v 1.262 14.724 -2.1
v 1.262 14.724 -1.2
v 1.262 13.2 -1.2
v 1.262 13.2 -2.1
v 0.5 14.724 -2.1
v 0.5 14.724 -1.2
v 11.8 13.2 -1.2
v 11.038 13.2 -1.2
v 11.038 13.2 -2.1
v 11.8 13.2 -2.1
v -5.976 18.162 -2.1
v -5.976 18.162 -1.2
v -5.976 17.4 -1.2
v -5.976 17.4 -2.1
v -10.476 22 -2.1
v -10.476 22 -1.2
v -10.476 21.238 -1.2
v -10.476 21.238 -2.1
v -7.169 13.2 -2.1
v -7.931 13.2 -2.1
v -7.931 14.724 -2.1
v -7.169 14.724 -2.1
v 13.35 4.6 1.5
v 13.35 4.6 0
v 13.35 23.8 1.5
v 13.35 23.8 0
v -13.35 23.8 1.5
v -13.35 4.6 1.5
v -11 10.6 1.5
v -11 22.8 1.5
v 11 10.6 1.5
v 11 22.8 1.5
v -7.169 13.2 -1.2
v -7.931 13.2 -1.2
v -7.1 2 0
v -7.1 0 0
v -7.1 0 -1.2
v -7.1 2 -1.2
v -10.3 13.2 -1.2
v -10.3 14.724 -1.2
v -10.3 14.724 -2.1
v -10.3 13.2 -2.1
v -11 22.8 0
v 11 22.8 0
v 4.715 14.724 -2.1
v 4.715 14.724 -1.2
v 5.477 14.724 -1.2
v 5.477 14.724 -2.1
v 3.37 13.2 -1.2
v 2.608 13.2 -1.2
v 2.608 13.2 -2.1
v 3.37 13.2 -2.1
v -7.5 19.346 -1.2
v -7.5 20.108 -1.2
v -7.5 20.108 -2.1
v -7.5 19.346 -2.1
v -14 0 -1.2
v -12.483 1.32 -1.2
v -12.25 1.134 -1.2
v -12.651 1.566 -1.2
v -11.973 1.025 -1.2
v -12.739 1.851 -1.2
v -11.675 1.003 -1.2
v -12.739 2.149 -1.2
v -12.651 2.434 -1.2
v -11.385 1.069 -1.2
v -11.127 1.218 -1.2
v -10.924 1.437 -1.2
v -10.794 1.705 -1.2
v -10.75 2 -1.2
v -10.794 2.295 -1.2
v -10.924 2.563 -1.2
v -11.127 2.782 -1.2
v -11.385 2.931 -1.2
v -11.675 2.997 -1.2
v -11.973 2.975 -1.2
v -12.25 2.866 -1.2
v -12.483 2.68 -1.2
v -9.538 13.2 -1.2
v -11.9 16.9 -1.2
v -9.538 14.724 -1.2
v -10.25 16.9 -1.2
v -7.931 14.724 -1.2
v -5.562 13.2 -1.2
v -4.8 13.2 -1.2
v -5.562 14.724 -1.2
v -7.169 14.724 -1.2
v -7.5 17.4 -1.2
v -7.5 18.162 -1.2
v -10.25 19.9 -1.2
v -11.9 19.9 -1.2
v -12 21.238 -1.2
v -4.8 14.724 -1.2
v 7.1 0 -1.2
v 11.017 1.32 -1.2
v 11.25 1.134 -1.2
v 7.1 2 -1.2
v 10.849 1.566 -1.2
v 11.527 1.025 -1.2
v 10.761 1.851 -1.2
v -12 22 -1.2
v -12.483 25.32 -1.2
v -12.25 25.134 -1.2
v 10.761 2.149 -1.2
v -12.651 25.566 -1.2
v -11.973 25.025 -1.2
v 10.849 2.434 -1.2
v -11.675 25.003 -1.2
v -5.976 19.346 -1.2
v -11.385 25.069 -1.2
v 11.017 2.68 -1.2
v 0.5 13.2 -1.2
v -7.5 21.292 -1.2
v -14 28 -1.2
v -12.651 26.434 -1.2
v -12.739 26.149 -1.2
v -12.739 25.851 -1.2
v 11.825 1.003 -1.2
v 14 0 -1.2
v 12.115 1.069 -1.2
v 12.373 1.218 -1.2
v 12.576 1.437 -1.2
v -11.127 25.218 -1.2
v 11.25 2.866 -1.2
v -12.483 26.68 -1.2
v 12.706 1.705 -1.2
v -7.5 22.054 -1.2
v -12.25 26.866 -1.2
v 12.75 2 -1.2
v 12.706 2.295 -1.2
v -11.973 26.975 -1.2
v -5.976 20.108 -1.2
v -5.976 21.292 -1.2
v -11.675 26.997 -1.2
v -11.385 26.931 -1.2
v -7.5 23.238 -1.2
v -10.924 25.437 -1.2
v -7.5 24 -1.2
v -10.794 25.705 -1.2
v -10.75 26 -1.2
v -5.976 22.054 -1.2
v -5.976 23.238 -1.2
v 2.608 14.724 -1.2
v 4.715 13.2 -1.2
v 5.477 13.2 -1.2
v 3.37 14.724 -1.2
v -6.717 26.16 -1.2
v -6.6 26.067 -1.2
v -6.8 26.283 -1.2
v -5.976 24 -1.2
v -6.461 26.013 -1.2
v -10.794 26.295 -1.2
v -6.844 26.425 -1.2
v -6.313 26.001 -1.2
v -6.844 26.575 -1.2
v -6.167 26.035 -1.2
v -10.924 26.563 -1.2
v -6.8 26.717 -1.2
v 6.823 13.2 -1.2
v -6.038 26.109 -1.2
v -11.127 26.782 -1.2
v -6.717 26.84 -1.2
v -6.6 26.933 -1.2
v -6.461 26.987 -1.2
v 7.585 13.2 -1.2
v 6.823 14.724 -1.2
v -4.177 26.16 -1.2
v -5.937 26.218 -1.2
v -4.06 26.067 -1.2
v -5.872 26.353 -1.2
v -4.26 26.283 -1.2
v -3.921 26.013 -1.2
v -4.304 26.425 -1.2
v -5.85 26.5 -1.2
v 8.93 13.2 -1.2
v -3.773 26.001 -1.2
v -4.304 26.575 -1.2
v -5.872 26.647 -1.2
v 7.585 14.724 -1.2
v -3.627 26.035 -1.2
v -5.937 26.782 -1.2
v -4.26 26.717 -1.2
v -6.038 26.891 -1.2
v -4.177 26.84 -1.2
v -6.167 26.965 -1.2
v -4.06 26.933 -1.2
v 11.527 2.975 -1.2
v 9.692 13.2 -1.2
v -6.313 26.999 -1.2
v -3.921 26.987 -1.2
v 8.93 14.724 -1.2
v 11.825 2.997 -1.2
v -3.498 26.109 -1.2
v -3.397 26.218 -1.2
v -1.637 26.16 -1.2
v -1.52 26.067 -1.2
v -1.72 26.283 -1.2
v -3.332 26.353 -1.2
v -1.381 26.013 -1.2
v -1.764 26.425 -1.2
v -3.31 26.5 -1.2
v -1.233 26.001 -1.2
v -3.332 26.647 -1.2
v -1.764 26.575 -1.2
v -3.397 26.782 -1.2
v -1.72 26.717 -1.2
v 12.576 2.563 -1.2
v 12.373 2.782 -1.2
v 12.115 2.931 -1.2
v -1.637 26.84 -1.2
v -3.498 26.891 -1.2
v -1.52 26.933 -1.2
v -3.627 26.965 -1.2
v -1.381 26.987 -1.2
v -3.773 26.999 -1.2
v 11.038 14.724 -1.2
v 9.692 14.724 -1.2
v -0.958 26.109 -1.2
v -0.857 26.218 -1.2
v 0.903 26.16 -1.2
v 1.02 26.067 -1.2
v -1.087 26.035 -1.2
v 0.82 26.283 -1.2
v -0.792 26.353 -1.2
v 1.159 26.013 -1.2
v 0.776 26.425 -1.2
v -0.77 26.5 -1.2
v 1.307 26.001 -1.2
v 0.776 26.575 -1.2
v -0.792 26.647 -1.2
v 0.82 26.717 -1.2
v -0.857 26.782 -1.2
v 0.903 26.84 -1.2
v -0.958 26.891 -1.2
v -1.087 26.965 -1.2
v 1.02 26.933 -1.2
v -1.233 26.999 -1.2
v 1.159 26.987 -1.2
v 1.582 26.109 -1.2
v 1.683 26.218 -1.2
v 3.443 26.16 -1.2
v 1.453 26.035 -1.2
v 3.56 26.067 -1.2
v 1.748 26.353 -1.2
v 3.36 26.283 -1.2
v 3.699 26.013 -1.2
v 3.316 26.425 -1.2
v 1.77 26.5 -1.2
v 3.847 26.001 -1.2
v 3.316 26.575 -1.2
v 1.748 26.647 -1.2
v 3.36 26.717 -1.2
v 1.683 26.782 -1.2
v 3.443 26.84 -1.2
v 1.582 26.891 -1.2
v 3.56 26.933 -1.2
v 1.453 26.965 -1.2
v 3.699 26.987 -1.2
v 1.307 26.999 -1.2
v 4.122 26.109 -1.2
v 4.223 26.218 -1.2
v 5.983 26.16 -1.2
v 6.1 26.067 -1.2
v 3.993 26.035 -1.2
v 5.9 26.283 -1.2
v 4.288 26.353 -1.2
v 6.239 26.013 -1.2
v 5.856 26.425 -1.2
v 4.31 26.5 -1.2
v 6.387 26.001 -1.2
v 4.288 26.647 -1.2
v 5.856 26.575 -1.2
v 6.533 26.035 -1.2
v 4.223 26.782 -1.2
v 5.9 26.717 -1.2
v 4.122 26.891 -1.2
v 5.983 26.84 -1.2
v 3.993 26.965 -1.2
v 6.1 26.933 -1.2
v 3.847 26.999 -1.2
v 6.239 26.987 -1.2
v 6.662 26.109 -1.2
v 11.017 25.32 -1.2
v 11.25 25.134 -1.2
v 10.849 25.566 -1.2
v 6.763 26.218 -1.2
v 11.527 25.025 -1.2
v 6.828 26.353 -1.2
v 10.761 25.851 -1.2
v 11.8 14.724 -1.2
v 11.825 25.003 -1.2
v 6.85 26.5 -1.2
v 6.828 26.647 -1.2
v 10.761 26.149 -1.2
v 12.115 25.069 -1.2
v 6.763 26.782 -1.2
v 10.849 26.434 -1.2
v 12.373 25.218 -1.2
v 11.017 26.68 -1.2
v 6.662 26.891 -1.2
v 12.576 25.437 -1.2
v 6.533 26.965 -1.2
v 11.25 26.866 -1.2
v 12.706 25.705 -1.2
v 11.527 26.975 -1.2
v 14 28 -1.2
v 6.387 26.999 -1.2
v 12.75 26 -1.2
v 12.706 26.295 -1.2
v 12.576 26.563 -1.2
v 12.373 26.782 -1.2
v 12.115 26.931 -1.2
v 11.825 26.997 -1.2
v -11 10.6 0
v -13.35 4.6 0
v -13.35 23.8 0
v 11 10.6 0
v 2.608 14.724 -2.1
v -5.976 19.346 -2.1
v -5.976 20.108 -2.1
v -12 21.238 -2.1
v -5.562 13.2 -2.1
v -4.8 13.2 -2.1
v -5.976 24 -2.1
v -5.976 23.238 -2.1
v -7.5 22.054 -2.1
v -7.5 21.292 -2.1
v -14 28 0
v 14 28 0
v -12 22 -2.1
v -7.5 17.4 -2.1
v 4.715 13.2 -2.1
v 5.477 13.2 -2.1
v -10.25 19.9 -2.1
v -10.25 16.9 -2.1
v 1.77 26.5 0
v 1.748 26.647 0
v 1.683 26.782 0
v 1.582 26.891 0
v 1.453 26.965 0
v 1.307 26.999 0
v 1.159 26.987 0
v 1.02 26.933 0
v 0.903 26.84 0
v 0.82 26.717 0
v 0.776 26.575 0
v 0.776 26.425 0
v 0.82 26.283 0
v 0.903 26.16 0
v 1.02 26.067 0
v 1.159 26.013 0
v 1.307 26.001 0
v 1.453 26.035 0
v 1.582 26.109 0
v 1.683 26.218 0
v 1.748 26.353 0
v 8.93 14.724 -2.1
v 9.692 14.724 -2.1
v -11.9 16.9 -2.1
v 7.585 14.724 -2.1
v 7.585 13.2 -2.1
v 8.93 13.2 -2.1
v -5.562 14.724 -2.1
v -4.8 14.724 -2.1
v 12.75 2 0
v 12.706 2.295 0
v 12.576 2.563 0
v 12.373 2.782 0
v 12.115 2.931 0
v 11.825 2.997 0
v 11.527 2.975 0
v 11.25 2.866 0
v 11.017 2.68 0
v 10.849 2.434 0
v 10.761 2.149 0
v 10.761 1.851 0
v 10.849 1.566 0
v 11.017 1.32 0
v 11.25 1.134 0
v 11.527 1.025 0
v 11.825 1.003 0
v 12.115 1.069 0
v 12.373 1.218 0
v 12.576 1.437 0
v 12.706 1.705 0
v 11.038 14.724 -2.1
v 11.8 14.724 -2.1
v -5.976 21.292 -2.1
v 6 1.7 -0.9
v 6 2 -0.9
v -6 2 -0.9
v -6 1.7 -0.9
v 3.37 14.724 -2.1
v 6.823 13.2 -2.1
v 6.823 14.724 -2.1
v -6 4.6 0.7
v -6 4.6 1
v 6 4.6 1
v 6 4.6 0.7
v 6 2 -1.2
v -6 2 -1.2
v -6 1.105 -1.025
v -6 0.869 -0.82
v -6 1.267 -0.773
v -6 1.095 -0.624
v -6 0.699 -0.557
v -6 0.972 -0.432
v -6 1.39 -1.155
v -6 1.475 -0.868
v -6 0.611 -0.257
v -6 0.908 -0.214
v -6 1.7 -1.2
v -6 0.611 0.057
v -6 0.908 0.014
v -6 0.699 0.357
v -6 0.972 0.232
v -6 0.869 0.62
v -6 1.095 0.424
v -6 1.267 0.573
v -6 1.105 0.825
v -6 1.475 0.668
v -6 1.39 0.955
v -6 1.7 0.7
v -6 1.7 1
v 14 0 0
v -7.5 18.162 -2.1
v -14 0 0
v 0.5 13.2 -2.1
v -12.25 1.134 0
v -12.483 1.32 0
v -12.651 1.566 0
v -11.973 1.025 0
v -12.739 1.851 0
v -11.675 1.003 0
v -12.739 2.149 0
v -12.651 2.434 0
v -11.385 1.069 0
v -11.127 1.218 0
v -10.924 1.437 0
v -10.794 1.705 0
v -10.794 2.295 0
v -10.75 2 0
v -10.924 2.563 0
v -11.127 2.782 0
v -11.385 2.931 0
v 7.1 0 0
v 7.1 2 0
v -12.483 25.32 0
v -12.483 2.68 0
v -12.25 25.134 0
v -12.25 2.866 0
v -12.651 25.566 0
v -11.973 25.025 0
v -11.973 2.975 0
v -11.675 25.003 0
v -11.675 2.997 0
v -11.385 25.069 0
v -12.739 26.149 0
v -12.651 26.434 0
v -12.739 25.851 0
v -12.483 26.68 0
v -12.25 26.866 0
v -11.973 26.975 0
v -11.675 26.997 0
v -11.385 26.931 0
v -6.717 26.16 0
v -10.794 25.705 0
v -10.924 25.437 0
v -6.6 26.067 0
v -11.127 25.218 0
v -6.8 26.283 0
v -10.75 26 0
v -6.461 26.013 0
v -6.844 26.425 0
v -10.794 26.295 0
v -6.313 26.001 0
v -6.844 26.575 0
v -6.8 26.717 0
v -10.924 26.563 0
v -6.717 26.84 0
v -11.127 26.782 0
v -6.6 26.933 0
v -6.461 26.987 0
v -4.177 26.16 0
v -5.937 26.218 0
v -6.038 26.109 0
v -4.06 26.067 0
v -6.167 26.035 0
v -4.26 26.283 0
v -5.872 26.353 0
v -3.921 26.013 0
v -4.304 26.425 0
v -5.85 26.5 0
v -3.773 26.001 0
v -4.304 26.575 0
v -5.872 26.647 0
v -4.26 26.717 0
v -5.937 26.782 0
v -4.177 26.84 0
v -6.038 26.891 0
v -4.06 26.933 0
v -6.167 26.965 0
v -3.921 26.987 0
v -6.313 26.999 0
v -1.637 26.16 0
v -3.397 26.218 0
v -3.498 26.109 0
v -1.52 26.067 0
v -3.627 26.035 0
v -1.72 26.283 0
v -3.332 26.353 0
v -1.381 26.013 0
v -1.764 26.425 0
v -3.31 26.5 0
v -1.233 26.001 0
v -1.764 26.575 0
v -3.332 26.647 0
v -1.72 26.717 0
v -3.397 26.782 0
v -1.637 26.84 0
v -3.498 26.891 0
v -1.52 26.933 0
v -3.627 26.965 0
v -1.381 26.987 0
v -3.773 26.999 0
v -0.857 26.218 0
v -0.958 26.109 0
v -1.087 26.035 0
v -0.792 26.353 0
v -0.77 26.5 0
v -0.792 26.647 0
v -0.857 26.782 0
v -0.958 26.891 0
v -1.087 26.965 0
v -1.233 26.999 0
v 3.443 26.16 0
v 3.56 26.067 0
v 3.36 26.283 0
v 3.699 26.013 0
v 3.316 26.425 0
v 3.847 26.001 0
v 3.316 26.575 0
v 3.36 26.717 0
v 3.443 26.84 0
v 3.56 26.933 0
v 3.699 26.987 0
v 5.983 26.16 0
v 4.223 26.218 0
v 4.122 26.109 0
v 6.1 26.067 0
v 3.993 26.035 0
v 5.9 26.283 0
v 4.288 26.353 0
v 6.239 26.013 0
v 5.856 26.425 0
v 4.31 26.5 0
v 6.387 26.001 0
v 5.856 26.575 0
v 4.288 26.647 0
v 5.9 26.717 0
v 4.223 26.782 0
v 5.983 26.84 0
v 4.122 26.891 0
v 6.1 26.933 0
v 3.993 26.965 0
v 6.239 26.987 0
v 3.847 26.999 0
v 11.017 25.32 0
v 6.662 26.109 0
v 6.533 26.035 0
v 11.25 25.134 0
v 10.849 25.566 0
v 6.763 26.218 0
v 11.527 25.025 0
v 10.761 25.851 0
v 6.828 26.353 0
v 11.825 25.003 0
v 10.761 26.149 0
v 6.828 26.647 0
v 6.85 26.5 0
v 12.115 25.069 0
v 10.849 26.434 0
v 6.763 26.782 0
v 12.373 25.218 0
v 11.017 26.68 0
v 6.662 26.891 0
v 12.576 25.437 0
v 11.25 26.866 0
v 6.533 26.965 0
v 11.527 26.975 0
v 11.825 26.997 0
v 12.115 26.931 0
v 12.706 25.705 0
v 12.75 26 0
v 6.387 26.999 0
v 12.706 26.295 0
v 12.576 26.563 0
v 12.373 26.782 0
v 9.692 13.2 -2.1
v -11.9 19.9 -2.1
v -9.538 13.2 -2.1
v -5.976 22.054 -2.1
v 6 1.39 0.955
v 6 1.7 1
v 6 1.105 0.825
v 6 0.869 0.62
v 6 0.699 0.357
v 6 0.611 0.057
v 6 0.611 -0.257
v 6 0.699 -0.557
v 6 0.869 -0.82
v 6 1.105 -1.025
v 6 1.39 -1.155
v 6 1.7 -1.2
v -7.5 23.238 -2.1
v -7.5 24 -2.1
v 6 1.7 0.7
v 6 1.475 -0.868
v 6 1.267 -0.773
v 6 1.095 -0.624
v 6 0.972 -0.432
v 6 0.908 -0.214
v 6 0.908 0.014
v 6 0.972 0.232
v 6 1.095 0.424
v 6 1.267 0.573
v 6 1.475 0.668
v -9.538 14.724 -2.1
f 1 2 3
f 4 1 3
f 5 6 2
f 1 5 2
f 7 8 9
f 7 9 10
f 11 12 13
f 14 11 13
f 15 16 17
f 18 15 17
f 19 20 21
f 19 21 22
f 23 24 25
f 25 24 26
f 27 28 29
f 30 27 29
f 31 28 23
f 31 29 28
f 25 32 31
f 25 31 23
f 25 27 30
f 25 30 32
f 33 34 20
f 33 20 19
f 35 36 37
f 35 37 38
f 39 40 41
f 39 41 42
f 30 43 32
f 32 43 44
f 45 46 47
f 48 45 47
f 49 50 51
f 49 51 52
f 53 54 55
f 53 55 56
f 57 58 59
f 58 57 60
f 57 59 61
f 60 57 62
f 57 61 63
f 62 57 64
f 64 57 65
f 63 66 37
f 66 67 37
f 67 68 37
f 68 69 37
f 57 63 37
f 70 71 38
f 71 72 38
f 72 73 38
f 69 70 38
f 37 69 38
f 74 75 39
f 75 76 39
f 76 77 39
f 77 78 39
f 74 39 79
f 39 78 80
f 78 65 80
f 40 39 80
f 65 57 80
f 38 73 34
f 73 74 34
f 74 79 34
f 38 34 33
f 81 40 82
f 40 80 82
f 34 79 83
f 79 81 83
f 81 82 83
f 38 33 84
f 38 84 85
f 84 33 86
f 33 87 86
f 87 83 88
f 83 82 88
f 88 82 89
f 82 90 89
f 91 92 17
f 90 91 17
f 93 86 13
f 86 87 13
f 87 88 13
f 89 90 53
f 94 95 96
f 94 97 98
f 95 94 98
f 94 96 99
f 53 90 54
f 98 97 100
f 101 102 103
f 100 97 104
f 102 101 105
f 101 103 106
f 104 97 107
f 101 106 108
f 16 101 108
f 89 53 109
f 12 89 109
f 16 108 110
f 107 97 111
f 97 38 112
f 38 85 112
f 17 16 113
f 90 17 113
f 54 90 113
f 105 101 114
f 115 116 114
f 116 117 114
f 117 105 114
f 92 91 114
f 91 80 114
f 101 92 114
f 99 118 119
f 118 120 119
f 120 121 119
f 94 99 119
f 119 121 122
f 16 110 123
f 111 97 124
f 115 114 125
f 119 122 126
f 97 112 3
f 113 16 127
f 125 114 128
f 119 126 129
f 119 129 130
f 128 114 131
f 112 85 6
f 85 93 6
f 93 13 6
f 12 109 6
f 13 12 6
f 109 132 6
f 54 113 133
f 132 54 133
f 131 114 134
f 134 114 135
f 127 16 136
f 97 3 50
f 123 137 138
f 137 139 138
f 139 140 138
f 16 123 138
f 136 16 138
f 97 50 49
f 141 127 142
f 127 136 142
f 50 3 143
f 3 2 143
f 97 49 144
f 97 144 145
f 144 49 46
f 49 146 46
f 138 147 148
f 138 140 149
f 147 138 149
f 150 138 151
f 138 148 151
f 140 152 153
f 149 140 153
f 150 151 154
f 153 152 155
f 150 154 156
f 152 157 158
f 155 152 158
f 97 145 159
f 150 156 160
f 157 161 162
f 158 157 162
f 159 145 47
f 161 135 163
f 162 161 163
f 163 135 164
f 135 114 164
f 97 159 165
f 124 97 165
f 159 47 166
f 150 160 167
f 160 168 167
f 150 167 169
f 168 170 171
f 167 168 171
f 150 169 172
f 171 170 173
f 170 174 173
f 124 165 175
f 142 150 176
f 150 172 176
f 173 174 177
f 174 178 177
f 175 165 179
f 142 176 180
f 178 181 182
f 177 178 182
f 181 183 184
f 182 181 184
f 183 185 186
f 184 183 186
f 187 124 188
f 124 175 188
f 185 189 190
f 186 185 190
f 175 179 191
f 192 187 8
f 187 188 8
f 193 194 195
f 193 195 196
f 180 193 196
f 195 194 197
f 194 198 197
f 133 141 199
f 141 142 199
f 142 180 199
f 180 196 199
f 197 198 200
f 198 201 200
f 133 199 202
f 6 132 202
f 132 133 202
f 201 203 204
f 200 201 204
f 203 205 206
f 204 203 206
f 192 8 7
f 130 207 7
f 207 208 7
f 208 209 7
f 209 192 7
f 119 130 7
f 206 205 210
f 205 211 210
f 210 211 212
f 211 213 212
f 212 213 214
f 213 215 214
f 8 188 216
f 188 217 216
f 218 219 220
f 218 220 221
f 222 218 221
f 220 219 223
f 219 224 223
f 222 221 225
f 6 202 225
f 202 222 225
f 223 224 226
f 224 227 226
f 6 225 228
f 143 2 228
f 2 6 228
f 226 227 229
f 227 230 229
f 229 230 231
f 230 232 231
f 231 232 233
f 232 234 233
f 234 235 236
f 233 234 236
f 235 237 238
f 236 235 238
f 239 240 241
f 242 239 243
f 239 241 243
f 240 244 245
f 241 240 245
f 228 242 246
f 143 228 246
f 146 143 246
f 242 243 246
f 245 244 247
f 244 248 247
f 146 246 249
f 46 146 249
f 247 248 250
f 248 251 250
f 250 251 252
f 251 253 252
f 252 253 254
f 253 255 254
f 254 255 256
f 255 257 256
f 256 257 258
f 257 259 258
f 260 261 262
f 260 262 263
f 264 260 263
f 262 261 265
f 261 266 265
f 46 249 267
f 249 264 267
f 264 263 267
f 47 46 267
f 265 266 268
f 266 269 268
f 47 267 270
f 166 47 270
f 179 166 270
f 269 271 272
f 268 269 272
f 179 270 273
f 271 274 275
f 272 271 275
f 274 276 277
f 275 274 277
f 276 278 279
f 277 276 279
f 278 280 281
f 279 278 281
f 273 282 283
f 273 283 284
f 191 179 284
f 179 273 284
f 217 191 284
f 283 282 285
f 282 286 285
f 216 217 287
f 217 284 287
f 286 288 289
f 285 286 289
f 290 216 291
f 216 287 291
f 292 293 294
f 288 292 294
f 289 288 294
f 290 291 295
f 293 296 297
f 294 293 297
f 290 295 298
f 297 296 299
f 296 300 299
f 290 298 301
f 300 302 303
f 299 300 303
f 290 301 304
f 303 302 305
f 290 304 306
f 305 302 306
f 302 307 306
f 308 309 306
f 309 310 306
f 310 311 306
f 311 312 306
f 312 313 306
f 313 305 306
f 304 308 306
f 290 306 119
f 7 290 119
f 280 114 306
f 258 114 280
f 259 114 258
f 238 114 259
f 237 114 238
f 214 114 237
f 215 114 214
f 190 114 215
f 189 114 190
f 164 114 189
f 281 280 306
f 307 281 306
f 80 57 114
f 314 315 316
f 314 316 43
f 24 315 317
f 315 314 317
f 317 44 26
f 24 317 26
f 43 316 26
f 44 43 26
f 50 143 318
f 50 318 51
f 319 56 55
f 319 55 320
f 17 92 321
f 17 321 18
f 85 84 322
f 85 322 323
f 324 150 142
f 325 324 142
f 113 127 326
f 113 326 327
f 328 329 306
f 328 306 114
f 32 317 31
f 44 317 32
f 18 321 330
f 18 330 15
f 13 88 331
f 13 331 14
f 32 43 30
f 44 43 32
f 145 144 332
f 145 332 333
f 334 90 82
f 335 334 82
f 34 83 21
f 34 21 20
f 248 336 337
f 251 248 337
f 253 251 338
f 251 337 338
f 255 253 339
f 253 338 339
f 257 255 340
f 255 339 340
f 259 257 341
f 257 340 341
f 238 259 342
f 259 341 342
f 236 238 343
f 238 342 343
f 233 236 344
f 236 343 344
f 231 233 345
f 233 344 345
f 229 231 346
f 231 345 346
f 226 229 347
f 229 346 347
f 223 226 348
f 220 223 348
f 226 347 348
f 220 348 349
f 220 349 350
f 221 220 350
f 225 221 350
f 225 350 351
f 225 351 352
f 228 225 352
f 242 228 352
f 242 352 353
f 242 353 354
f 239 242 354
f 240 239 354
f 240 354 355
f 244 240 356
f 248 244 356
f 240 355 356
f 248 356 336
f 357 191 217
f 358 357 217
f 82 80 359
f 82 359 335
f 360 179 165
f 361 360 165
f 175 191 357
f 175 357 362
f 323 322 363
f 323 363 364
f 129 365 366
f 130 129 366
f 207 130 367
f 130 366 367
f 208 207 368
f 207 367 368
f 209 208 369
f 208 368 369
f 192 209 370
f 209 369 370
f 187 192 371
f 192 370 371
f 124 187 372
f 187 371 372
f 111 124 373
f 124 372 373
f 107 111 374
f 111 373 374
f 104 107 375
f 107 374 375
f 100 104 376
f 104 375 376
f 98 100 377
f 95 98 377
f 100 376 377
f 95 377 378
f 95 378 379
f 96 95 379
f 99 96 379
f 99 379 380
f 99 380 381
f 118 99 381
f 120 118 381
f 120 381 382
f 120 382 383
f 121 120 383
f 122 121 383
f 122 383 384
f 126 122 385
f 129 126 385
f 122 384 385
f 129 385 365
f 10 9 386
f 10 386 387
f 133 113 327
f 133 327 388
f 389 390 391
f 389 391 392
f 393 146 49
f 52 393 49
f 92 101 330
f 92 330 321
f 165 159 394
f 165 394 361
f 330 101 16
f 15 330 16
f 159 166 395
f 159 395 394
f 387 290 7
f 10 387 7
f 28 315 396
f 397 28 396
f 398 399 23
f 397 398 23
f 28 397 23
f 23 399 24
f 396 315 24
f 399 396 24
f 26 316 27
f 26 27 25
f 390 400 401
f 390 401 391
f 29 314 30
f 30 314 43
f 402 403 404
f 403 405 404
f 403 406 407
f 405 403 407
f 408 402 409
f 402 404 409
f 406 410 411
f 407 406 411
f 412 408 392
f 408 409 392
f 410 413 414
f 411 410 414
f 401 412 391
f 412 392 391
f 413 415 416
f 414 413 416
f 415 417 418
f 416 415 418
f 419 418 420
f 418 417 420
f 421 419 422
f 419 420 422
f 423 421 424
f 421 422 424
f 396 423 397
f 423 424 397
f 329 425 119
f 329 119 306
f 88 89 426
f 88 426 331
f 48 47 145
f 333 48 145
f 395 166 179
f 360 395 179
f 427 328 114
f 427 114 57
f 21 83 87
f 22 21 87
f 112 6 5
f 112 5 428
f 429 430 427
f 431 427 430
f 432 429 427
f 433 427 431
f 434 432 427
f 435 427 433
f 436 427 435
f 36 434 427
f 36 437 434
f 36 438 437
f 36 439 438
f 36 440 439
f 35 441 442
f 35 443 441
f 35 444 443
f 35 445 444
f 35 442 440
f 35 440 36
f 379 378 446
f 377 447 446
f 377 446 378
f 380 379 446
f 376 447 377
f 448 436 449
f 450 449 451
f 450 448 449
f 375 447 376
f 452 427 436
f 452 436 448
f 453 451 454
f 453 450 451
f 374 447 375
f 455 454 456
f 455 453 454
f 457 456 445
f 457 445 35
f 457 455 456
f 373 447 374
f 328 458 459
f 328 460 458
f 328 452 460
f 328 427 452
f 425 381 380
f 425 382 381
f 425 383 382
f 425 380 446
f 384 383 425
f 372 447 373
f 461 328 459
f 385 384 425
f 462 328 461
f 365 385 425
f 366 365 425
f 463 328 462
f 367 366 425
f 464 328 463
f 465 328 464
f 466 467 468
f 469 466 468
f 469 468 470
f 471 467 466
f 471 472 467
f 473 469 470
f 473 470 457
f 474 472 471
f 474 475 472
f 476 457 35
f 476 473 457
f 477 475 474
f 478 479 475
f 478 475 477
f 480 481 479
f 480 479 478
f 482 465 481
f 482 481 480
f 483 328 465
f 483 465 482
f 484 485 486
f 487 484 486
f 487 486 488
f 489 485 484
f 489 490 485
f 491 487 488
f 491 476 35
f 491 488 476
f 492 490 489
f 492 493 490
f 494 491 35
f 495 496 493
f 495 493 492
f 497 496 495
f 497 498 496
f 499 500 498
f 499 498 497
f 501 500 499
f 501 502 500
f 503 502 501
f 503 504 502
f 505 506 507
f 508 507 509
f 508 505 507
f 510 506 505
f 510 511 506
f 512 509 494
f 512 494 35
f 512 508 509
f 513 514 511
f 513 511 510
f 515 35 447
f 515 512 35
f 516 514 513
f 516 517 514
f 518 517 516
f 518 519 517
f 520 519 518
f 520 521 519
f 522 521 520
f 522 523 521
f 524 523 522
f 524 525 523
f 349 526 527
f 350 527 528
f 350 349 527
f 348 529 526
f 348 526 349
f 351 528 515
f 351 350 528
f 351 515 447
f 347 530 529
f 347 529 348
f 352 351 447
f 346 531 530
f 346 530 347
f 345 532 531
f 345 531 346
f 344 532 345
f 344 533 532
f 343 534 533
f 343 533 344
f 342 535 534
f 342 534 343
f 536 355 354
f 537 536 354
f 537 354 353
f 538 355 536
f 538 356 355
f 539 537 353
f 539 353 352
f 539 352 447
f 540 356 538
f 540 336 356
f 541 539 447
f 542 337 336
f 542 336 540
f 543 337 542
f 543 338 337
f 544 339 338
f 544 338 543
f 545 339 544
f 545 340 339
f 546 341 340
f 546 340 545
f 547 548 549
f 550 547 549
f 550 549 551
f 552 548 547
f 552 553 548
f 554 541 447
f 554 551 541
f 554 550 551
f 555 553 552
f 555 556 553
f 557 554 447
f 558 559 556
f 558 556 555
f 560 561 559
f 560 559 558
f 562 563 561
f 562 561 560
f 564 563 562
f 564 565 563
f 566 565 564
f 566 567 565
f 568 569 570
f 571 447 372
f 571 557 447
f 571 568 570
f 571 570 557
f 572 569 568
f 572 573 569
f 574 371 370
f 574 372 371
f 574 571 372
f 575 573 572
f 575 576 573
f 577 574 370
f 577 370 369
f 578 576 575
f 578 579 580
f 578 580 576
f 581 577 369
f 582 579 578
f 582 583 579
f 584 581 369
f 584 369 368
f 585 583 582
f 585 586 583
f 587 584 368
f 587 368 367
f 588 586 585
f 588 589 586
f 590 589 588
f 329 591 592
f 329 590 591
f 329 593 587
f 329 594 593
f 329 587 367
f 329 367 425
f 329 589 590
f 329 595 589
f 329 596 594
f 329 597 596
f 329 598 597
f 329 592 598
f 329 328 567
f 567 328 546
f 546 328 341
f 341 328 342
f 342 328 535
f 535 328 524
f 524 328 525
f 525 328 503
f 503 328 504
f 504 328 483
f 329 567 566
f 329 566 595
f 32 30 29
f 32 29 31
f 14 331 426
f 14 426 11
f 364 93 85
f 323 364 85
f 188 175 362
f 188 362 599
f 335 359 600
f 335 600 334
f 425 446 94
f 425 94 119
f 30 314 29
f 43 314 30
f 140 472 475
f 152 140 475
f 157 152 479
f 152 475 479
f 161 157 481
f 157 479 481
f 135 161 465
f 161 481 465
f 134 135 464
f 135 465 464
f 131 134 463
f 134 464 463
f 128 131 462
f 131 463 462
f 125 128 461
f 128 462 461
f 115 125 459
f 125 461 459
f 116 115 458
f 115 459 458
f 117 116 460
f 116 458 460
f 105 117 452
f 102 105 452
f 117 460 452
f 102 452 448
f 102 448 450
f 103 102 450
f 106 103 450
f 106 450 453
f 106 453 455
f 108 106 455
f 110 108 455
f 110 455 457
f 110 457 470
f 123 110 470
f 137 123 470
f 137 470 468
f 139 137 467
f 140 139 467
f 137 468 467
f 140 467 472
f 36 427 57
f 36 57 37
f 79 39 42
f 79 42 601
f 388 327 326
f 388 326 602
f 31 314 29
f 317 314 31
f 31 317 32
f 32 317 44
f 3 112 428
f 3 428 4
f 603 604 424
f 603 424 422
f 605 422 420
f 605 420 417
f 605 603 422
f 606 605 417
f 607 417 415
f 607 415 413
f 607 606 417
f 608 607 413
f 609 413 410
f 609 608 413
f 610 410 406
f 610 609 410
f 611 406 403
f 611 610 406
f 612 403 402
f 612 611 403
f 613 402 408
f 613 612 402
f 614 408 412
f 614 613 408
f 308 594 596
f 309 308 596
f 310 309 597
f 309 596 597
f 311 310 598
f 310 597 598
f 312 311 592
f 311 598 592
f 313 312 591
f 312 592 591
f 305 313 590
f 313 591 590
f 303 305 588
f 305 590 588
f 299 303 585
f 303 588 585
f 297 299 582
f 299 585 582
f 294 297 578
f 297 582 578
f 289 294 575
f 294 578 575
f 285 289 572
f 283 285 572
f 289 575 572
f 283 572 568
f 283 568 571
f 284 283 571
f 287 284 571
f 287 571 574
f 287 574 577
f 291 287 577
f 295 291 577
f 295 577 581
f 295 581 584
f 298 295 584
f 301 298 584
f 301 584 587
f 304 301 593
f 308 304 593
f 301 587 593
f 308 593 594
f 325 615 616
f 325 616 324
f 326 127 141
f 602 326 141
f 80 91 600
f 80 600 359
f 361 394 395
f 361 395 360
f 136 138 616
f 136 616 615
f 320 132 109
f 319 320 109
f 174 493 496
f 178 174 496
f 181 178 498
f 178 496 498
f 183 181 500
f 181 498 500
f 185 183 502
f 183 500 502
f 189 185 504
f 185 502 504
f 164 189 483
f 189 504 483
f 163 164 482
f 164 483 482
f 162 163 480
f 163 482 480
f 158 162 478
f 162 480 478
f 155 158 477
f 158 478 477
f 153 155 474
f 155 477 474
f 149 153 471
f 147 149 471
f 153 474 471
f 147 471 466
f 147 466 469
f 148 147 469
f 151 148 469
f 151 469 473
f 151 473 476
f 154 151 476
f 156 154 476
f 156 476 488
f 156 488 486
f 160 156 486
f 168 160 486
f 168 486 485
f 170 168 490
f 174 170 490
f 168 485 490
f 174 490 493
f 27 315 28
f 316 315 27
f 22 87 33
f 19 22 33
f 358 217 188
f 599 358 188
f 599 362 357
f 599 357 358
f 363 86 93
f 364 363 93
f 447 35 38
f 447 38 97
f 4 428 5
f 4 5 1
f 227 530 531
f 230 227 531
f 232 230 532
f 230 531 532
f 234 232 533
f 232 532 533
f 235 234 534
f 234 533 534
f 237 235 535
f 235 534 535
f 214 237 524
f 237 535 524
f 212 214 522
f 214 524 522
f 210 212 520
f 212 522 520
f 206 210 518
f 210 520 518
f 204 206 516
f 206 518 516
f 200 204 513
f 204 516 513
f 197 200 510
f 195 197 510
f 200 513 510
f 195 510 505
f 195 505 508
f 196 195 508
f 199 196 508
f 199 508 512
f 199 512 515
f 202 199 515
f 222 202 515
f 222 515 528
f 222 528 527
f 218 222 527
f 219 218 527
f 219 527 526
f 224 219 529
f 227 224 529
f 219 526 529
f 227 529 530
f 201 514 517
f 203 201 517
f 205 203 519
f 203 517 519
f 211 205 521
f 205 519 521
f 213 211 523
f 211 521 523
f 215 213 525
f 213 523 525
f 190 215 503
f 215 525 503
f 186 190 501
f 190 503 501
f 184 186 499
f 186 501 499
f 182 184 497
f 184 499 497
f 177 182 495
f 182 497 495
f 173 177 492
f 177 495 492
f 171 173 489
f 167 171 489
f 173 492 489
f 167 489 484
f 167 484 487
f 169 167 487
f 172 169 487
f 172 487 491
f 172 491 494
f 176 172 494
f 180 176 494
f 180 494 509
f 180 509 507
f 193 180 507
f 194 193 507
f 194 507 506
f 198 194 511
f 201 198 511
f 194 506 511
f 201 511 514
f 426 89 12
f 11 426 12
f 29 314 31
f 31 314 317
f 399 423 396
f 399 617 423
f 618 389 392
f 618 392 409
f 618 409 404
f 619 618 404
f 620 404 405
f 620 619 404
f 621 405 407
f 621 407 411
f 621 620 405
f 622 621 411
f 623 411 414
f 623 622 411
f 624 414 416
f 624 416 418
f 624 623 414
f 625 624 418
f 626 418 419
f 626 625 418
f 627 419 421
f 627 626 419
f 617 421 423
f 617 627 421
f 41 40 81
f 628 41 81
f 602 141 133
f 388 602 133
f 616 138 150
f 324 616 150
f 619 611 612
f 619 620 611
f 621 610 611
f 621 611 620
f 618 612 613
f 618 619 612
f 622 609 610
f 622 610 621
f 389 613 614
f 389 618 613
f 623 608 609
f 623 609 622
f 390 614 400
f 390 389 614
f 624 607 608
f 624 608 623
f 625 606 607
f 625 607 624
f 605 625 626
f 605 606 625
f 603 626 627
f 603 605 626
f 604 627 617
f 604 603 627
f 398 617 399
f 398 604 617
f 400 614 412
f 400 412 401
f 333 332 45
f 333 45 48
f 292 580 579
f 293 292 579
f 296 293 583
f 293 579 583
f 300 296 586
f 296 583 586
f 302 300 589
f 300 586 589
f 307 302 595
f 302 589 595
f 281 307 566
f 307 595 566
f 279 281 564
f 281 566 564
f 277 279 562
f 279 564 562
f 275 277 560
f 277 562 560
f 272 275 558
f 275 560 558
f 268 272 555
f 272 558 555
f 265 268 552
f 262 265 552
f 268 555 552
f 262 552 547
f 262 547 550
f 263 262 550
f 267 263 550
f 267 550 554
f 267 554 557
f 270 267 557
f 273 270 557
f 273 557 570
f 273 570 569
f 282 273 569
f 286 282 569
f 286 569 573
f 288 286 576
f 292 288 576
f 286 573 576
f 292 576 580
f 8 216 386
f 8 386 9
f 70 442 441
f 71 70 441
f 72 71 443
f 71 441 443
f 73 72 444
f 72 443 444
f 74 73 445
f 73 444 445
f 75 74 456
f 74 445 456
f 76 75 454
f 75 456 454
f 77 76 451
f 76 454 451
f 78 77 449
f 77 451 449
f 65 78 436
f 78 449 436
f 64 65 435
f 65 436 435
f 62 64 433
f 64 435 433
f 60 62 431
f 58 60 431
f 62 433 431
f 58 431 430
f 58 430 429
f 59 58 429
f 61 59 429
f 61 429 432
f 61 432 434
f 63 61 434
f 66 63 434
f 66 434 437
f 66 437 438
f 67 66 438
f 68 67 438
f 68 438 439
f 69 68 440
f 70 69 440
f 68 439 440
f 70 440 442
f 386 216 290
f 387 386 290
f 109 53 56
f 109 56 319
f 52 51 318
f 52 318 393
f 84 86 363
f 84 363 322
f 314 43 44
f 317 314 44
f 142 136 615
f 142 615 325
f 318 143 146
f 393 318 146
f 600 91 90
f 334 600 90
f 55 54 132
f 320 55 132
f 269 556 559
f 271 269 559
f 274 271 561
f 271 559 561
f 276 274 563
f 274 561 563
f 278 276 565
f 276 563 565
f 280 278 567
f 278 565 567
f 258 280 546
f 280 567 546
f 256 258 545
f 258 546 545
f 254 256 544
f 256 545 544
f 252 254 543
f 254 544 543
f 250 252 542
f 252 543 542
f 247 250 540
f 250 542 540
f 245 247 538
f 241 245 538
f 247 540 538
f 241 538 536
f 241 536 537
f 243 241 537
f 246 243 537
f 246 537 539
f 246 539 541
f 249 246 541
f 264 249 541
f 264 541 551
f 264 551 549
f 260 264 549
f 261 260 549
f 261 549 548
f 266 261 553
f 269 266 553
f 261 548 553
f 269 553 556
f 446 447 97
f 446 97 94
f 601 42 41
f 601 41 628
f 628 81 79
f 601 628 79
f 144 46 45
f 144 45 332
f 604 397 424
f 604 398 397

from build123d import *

# Parameters (mm, degrees)
F0_R     = 1
F0_R_2   = 0.5
F1_DEPTH = 1.2
F2_W     = 26.7
F2_H     = 19.2
F2_W_2   = 22
F2_H_2   = 12.2
F3_DEPTH = 1.5
F4_DEPTH = 1.5
F6_DEPTH = 6
F7_W     = 0.762
F7_H     = 1.524
F7_W_2   = 1.65
F7_H_2   = 3
F7_W_3   = 1.524
F7_H_3   = 0.762
F8_DEPTH = 0.9


with BuildPart() as f1:
    # F0 (on Top) → F1 (new body)
    with BuildSketch(Plane.XY):
        Polygon((14, 0), (14, 28), (-14, 28), (-14, 0), (-7.1, 0), (-7.1, 2), (7.1, 2), (7.1, 0), align=None)
        with Locations((-11.75, 2)):
            Circle(F0_R, mode=Mode.SUBTRACT)
        with Locations((11.75, 2)):
            Circle(F0_R, mode=Mode.SUBTRACT)
        with Locations((-11.75, 26)):
            Circle(F0_R, mode=Mode.SUBTRACT)
        with Locations((-6.35, 26.5)):
            Circle(F0_R_2, mode=Mode.SUBTRACT)
        with Locations((-3.81, 26.5)):
            Circle(F0_R_2, mode=Mode.SUBTRACT)
        with Locations((-1.27, 26.5)):
            Circle(F0_R_2, mode=Mode.SUBTRACT)
        with Locations((1.27, 26.5)):
            Circle(F0_R_2, mode=Mode.SUBTRACT)
        with Locations((3.81, 26.5)):
            Circle(F0_R_2, mode=Mode.SUBTRACT)
        with Locations((6.35, 26.5)):
            Circle(F0_R_2, mode=Mode.SUBTRACT)
        with Locations((11.75, 26)):
            Circle(F0_R, mode=Mode.SUBTRACT)
    extrude(amount=-F1_DEPTH)

    # F7 (on face) → F8 (join)
    with BuildSketch(Plane(origin=(0, 0, -1.2), x_dir=(1, 0, 0), z_dir=(0, 0, -1))):
        with Locations((11.419, -13.962)):
            Rectangle(F7_W, F7_H)
        with Locations((9.3114, -13.962)):
            Rectangle(F7_W, F7_H)
        with Locations((7.2038, -13.962)):
            Rectangle(F7_W, F7_H)
        with Locations((5.0962, -13.962)):
            Rectangle(F7_W, F7_H)
        with Locations((2.9886, -13.962)):
            Rectangle(F7_W, F7_H)
        with Locations((0.881, -13.962)):
            Rectangle(F7_W, F7_H)
        with Locations((-5.181, -13.962)):
            Rectangle(F7_W, F7_H)
        with Locations((-11.075, -18.4)):
            Rectangle(F7_W_2, F7_H_2)
        with Locations((-11.238, -21.619)):
            Rectangle(F7_W_3, F7_H_3)
        with Locations((-6.738, -23.619)):
            Rectangle(F7_W_3, F7_H_3)
        with Locations((-7.55, -13.962)):
            Rectangle(F7_W, F7_H)
        with Locations((-9.919, -13.962)):
            Rectangle(F7_W, F7_H)
        with Locations((-6.738, -21.673)):
            Rectangle(F7_W_3, F7_H_3)
        with Locations((-6.738, -19.727)):
            Rectangle(F7_W_3, F7_H_3)
        with Locations((-6.738, -17.781)):
            Rectangle(F7_W_3, F7_H_3)
    extrude(amount=F8_DEPTH)


with BuildPart() as f3:
    # F2 (on Top) → F3 (new body)
    with BuildSketch(Plane.XY):
        with Locations((0, 14.2)):
            Rectangle(F2_W, F2_H)
        with Locations((0, 16.7)):
            Rectangle(F2_W_2, F2_H_2, mode=Mode.SUBTRACT)
    extrude(amount=F3_DEPTH)

    # F5 (on Right) → F6 (join, symmetric)
    with BuildSketch(Plane.YZ):
        with BuildLine():
            Line((4.6, 1), (1.7, 1))
            ThreePointArc((1.7, 1), (0.6, -0.1), (1.7, -1.2))
            Line((1.7, -1.2), (2, -1.2))
            Line((2, -1.2), (2, -0.9))
            Line((2, -0.9), (1.7, -0.9))
            ThreePointArc((1.7, -0.9), (0.9, -0.1), (1.7, 0.7))
            Line((1.7, 0.7), (4.6, 0.7))
            Line((4.6, 0.7), (4.6, 1))
        make_face()
    extrude(amount=F6_DEPTH, both=True)


with BuildPart() as f4:
    # F2 (on Top) → F4 (new body, through all)
    with BuildSketch(Plane.XY):
        with Locations((0, 16.7)):
            Rectangle(F2_W_2, F2_H_2)
    extrude(amount=F4_DEPTH)


solid = Compound([f1.part, f3.part, f4.part])
